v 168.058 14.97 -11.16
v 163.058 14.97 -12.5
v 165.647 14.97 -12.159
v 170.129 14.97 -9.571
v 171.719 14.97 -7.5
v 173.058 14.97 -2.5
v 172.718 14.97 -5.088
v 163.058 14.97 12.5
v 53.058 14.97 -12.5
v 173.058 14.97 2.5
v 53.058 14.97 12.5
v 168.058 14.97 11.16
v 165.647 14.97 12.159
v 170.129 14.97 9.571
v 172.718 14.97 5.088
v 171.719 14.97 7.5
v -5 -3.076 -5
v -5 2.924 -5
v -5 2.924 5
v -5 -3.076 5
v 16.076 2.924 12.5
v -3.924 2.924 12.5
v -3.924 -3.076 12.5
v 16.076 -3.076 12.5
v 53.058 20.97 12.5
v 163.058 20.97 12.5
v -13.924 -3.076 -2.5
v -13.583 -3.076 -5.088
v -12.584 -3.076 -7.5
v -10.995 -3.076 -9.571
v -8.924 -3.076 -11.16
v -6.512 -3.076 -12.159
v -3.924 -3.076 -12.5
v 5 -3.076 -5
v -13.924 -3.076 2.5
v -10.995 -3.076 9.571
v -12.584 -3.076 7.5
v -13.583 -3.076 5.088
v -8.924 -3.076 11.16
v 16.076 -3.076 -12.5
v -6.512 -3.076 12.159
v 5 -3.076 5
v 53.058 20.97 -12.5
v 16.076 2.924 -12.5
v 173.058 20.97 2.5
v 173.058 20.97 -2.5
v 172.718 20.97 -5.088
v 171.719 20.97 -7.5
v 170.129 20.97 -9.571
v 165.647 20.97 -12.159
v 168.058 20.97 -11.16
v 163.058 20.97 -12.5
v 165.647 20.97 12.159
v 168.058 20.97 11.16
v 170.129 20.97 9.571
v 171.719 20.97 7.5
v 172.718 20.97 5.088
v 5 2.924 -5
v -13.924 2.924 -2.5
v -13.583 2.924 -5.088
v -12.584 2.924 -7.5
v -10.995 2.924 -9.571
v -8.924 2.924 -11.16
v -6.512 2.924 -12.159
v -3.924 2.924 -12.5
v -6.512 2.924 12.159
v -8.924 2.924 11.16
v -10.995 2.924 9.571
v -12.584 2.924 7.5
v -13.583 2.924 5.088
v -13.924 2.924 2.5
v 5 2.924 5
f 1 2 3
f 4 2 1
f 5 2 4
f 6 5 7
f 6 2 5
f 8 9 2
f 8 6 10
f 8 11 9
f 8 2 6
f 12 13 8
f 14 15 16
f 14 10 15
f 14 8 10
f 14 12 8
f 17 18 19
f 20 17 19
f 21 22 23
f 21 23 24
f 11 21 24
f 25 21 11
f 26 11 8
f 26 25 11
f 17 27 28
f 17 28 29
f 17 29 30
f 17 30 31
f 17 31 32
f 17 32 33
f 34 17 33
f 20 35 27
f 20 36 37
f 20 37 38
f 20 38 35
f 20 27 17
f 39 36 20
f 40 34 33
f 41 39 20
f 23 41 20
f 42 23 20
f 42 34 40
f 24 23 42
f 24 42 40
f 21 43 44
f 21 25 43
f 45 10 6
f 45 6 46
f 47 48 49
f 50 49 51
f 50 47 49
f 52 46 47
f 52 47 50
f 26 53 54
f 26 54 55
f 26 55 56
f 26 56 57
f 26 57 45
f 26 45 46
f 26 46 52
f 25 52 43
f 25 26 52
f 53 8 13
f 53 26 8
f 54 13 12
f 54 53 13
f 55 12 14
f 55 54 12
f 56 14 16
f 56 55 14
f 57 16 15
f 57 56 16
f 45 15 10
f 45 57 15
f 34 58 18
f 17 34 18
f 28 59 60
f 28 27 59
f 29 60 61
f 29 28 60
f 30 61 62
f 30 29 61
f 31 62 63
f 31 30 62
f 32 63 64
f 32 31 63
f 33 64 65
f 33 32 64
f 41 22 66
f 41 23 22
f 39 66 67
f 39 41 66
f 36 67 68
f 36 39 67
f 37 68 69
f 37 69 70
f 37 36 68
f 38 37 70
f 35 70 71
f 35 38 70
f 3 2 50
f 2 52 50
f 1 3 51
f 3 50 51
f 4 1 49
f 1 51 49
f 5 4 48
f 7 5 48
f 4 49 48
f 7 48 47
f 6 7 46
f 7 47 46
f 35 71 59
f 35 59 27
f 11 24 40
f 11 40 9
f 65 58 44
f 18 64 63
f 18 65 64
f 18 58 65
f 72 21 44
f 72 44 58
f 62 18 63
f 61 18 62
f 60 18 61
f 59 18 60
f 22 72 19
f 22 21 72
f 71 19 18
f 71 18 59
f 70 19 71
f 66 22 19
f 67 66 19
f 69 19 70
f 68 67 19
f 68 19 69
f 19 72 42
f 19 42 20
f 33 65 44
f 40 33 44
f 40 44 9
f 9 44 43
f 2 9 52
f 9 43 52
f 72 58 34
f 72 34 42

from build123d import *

# Parameters (mm, degrees)
F1_DEPTH = 12.5
F2_R     = 10
F3_R     = 10
F4_W     = 10
F4_H     = 10
F5_DEPTH = 6


with BuildPart() as f1:
    # F0 (on Top) → F1 (new body, symmetric)
    with BuildSketch(Plane.XY):
        Polygon((16.076079, 2.923578), (-13.923921, 2.923578), (-13.923921, -3.076422), (16.076079, -3.076422), (53.058334, 14.969733), (173.058334, 14.969733), (173.058334, 20.969733), (53.058334, 20.969733), align=None)
    extrude(amount=F1_DEPTH, both=True)

    # F2
    f2_edges = [f1.edges().sort_by_distance(p)[0] for p in [
        (-13.923921, -0.076422, 12.5),
    ]]
    fillet(f2_edges, radius=F2_R)

    # F3
    f3_edges = [f1.edges().sort_by_distance(p)[0] for p in [
        (-13.923921, -0.076422, -12.5),
        (173.058334, 17.969733, 12.5),
        (173.058334, 17.969733, -12.5),
    ]]
    fillet(f3_edges, radius=F3_R)

    # F4 (on face) → F5 (cut, through all)
    with BuildSketch(Plane(origin=(0, 2.923578, 0), x_dir=(-1, 0, 0), z_dir=(0, 1, 0))):
        Rectangle(F4_W, F4_H)
    extrude(amount=-F5_DEPTH, mode=Mode.SUBTRACT)


solid = f1.part
